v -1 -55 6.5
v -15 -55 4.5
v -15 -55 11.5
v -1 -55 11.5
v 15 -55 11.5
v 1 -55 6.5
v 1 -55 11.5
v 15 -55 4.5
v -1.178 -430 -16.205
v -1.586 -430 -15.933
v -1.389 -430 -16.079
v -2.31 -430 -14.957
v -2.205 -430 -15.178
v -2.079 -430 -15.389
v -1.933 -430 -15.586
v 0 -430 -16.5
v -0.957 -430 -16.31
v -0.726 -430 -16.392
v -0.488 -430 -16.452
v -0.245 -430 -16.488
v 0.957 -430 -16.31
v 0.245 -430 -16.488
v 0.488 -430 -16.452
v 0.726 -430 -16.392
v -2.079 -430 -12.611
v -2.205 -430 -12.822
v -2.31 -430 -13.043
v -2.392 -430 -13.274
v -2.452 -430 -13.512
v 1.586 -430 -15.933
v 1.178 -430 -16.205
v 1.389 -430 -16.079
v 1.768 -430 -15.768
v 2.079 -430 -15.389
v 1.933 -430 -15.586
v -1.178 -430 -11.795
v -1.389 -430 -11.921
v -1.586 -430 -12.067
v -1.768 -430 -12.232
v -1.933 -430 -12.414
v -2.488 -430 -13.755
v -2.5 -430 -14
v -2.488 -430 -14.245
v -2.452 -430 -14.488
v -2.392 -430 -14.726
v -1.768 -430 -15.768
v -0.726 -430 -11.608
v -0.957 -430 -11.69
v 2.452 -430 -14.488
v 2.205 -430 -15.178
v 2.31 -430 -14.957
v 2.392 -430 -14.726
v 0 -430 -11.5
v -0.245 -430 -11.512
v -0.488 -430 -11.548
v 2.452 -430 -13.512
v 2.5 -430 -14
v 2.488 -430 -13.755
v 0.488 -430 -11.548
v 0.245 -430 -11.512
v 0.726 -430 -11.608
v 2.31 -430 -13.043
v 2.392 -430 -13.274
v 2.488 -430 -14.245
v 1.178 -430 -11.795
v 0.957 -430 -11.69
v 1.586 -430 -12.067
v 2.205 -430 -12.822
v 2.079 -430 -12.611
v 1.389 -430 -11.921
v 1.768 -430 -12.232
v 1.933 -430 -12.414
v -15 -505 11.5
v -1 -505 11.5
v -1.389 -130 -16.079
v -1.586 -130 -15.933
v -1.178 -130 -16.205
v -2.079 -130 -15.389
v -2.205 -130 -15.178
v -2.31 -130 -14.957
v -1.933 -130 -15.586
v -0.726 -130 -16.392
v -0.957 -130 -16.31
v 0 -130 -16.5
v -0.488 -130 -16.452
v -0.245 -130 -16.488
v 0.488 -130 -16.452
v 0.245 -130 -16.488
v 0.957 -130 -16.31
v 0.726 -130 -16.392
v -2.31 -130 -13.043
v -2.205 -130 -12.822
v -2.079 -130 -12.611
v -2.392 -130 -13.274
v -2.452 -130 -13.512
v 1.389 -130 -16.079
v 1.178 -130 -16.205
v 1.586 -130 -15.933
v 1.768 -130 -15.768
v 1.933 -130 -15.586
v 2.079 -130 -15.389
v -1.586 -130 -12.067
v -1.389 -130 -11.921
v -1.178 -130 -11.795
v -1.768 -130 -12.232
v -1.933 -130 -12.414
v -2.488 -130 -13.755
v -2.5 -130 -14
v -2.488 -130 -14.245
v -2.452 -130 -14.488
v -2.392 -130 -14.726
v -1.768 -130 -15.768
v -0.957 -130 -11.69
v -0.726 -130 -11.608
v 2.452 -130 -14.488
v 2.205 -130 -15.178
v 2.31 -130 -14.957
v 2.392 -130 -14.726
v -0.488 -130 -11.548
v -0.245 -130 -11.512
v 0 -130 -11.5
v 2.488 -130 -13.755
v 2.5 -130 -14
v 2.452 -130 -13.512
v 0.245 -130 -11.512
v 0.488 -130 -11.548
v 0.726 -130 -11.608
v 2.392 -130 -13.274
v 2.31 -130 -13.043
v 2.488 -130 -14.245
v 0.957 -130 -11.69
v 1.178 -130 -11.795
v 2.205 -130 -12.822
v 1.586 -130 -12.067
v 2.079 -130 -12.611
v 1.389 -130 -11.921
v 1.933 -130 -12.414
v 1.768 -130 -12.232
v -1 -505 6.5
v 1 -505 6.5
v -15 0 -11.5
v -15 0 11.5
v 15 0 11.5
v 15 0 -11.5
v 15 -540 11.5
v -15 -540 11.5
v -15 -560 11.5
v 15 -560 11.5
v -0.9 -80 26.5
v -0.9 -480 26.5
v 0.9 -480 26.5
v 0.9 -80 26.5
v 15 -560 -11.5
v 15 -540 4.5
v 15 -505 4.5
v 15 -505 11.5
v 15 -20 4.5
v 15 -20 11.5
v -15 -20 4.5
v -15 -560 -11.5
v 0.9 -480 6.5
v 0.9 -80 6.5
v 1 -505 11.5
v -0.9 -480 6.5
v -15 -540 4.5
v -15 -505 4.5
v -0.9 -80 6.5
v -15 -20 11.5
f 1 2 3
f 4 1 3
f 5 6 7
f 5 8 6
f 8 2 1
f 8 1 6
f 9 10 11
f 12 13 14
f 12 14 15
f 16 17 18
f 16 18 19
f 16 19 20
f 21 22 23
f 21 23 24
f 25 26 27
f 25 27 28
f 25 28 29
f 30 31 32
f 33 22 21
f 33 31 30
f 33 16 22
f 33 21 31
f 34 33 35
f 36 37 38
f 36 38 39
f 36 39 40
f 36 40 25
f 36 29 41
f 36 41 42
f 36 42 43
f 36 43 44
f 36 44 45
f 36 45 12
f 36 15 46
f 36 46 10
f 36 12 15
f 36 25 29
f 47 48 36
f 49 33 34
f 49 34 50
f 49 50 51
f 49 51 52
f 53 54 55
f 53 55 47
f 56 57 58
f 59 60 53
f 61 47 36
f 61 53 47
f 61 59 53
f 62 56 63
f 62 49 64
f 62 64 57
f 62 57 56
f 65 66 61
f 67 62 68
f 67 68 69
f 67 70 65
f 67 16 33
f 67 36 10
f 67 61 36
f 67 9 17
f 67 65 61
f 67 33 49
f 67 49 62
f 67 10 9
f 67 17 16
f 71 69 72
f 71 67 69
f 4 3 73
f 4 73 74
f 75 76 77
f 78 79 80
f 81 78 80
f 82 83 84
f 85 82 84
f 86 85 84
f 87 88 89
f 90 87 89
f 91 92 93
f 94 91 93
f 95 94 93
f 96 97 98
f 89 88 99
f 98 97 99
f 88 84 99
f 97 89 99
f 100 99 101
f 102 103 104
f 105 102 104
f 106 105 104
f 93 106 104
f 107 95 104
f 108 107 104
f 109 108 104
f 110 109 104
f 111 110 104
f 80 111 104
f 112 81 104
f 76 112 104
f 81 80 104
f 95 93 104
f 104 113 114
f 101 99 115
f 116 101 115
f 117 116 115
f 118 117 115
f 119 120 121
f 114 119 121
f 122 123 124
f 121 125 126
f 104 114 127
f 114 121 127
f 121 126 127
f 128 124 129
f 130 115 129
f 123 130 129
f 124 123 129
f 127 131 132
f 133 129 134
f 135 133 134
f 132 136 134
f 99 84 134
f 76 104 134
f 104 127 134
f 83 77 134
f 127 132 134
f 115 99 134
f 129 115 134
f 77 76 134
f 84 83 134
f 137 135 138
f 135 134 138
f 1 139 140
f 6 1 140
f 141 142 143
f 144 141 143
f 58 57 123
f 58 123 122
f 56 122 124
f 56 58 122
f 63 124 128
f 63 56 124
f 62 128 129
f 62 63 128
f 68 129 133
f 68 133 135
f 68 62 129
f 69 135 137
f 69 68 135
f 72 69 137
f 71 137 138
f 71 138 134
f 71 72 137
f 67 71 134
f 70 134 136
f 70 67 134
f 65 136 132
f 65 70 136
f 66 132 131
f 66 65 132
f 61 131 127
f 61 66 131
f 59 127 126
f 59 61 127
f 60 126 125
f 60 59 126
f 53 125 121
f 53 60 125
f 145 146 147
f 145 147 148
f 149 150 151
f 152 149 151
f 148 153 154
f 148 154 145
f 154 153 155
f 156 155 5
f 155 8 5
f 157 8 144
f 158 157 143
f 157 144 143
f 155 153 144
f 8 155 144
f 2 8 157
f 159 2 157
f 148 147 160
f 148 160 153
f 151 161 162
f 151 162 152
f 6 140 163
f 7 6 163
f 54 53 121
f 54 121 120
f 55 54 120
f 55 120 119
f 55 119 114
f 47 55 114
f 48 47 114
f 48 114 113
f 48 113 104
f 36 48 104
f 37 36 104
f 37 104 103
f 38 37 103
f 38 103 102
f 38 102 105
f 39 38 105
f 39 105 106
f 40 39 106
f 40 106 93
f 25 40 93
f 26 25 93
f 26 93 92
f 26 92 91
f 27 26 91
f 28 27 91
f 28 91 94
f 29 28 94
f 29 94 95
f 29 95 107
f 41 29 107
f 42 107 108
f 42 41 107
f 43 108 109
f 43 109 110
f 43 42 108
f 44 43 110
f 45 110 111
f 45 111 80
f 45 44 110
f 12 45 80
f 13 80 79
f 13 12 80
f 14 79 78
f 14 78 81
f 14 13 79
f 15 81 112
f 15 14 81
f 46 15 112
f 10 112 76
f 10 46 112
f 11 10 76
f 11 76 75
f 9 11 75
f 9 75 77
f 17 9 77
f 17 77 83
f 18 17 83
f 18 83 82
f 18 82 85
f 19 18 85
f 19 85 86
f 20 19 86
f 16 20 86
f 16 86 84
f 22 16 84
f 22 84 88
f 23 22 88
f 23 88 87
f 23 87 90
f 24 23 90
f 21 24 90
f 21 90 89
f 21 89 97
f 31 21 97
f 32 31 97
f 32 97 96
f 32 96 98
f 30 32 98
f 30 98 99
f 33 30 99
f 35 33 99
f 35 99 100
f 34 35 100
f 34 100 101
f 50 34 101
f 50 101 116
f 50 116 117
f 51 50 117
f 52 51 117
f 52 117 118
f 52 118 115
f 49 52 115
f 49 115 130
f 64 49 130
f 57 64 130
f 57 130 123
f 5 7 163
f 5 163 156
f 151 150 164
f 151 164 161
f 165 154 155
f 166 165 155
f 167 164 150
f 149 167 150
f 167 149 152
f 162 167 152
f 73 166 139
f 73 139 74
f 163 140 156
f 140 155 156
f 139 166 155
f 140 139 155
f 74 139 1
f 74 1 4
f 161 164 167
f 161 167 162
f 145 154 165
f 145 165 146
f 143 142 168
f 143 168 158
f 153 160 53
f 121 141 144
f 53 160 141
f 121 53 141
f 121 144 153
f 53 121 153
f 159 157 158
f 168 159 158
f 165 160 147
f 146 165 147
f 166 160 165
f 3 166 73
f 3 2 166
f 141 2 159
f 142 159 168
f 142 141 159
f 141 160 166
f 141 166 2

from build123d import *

# Parameters (mm, degrees)
F0_W     = 30
F0_H     = 23
F1_DEPTH = 560
F2_W     = 35
F2_H     = 7
F3_DEPTH = 30.001
F4_W     = 2
F4_H     = 5
F5_DEPTH = 450
F7_START = -25
F6_W     = 1.8
F6_H     = 20
F7_DEPTH = 400
F9_START = -130
F8_R     = 2.5
F9_DEPTH = 300


with BuildPart() as f1:
    # F0 (on Front) → F1 (new body)
    with BuildSketch(Plane.XZ):
        Rectangle(F0_W, F0_H)
    extrude(amount=F1_DEPTH)

    # F2 (on face) → F3 (cut, through all)
    with BuildSketch(Plane.YZ.offset(15)):
        with Locations((-522.5, 8)):
            Rectangle(F2_W, F2_H)
        with Locations((-37.5, 8)):
            Rectangle(F2_W, F2_H)
    extrude(amount=-F3_DEPTH, mode=Mode.SUBTRACT)

    # F4 (on face) → F5 (cut, through all)
    with BuildSketch(Plane.XZ.offset(505)):
        with Locations((0, 9)):
            Rectangle(F4_W, F4_H)
    extrude(amount=-F5_DEPTH, mode=Mode.SUBTRACT)

    # F8 (on face) → F9 (join)
    with BuildSketch(Plane.XZ.offset(560).offset(F9_START)):
        with Locations((0, -14)):
            Circle(F8_R)
    extrude(amount=-F9_DEPTH)


with BuildPart() as f7:
    # F6 (on face) → F7 (new body)
    with BuildSketch(Plane.XZ.offset(505).offset(F7_START)):
        with Locations((0, 16.5)):
            Rectangle(F6_W, F6_H)
    extrude(amount=-F7_DEPTH)


solid = Compound([f1.part, f7.part])
